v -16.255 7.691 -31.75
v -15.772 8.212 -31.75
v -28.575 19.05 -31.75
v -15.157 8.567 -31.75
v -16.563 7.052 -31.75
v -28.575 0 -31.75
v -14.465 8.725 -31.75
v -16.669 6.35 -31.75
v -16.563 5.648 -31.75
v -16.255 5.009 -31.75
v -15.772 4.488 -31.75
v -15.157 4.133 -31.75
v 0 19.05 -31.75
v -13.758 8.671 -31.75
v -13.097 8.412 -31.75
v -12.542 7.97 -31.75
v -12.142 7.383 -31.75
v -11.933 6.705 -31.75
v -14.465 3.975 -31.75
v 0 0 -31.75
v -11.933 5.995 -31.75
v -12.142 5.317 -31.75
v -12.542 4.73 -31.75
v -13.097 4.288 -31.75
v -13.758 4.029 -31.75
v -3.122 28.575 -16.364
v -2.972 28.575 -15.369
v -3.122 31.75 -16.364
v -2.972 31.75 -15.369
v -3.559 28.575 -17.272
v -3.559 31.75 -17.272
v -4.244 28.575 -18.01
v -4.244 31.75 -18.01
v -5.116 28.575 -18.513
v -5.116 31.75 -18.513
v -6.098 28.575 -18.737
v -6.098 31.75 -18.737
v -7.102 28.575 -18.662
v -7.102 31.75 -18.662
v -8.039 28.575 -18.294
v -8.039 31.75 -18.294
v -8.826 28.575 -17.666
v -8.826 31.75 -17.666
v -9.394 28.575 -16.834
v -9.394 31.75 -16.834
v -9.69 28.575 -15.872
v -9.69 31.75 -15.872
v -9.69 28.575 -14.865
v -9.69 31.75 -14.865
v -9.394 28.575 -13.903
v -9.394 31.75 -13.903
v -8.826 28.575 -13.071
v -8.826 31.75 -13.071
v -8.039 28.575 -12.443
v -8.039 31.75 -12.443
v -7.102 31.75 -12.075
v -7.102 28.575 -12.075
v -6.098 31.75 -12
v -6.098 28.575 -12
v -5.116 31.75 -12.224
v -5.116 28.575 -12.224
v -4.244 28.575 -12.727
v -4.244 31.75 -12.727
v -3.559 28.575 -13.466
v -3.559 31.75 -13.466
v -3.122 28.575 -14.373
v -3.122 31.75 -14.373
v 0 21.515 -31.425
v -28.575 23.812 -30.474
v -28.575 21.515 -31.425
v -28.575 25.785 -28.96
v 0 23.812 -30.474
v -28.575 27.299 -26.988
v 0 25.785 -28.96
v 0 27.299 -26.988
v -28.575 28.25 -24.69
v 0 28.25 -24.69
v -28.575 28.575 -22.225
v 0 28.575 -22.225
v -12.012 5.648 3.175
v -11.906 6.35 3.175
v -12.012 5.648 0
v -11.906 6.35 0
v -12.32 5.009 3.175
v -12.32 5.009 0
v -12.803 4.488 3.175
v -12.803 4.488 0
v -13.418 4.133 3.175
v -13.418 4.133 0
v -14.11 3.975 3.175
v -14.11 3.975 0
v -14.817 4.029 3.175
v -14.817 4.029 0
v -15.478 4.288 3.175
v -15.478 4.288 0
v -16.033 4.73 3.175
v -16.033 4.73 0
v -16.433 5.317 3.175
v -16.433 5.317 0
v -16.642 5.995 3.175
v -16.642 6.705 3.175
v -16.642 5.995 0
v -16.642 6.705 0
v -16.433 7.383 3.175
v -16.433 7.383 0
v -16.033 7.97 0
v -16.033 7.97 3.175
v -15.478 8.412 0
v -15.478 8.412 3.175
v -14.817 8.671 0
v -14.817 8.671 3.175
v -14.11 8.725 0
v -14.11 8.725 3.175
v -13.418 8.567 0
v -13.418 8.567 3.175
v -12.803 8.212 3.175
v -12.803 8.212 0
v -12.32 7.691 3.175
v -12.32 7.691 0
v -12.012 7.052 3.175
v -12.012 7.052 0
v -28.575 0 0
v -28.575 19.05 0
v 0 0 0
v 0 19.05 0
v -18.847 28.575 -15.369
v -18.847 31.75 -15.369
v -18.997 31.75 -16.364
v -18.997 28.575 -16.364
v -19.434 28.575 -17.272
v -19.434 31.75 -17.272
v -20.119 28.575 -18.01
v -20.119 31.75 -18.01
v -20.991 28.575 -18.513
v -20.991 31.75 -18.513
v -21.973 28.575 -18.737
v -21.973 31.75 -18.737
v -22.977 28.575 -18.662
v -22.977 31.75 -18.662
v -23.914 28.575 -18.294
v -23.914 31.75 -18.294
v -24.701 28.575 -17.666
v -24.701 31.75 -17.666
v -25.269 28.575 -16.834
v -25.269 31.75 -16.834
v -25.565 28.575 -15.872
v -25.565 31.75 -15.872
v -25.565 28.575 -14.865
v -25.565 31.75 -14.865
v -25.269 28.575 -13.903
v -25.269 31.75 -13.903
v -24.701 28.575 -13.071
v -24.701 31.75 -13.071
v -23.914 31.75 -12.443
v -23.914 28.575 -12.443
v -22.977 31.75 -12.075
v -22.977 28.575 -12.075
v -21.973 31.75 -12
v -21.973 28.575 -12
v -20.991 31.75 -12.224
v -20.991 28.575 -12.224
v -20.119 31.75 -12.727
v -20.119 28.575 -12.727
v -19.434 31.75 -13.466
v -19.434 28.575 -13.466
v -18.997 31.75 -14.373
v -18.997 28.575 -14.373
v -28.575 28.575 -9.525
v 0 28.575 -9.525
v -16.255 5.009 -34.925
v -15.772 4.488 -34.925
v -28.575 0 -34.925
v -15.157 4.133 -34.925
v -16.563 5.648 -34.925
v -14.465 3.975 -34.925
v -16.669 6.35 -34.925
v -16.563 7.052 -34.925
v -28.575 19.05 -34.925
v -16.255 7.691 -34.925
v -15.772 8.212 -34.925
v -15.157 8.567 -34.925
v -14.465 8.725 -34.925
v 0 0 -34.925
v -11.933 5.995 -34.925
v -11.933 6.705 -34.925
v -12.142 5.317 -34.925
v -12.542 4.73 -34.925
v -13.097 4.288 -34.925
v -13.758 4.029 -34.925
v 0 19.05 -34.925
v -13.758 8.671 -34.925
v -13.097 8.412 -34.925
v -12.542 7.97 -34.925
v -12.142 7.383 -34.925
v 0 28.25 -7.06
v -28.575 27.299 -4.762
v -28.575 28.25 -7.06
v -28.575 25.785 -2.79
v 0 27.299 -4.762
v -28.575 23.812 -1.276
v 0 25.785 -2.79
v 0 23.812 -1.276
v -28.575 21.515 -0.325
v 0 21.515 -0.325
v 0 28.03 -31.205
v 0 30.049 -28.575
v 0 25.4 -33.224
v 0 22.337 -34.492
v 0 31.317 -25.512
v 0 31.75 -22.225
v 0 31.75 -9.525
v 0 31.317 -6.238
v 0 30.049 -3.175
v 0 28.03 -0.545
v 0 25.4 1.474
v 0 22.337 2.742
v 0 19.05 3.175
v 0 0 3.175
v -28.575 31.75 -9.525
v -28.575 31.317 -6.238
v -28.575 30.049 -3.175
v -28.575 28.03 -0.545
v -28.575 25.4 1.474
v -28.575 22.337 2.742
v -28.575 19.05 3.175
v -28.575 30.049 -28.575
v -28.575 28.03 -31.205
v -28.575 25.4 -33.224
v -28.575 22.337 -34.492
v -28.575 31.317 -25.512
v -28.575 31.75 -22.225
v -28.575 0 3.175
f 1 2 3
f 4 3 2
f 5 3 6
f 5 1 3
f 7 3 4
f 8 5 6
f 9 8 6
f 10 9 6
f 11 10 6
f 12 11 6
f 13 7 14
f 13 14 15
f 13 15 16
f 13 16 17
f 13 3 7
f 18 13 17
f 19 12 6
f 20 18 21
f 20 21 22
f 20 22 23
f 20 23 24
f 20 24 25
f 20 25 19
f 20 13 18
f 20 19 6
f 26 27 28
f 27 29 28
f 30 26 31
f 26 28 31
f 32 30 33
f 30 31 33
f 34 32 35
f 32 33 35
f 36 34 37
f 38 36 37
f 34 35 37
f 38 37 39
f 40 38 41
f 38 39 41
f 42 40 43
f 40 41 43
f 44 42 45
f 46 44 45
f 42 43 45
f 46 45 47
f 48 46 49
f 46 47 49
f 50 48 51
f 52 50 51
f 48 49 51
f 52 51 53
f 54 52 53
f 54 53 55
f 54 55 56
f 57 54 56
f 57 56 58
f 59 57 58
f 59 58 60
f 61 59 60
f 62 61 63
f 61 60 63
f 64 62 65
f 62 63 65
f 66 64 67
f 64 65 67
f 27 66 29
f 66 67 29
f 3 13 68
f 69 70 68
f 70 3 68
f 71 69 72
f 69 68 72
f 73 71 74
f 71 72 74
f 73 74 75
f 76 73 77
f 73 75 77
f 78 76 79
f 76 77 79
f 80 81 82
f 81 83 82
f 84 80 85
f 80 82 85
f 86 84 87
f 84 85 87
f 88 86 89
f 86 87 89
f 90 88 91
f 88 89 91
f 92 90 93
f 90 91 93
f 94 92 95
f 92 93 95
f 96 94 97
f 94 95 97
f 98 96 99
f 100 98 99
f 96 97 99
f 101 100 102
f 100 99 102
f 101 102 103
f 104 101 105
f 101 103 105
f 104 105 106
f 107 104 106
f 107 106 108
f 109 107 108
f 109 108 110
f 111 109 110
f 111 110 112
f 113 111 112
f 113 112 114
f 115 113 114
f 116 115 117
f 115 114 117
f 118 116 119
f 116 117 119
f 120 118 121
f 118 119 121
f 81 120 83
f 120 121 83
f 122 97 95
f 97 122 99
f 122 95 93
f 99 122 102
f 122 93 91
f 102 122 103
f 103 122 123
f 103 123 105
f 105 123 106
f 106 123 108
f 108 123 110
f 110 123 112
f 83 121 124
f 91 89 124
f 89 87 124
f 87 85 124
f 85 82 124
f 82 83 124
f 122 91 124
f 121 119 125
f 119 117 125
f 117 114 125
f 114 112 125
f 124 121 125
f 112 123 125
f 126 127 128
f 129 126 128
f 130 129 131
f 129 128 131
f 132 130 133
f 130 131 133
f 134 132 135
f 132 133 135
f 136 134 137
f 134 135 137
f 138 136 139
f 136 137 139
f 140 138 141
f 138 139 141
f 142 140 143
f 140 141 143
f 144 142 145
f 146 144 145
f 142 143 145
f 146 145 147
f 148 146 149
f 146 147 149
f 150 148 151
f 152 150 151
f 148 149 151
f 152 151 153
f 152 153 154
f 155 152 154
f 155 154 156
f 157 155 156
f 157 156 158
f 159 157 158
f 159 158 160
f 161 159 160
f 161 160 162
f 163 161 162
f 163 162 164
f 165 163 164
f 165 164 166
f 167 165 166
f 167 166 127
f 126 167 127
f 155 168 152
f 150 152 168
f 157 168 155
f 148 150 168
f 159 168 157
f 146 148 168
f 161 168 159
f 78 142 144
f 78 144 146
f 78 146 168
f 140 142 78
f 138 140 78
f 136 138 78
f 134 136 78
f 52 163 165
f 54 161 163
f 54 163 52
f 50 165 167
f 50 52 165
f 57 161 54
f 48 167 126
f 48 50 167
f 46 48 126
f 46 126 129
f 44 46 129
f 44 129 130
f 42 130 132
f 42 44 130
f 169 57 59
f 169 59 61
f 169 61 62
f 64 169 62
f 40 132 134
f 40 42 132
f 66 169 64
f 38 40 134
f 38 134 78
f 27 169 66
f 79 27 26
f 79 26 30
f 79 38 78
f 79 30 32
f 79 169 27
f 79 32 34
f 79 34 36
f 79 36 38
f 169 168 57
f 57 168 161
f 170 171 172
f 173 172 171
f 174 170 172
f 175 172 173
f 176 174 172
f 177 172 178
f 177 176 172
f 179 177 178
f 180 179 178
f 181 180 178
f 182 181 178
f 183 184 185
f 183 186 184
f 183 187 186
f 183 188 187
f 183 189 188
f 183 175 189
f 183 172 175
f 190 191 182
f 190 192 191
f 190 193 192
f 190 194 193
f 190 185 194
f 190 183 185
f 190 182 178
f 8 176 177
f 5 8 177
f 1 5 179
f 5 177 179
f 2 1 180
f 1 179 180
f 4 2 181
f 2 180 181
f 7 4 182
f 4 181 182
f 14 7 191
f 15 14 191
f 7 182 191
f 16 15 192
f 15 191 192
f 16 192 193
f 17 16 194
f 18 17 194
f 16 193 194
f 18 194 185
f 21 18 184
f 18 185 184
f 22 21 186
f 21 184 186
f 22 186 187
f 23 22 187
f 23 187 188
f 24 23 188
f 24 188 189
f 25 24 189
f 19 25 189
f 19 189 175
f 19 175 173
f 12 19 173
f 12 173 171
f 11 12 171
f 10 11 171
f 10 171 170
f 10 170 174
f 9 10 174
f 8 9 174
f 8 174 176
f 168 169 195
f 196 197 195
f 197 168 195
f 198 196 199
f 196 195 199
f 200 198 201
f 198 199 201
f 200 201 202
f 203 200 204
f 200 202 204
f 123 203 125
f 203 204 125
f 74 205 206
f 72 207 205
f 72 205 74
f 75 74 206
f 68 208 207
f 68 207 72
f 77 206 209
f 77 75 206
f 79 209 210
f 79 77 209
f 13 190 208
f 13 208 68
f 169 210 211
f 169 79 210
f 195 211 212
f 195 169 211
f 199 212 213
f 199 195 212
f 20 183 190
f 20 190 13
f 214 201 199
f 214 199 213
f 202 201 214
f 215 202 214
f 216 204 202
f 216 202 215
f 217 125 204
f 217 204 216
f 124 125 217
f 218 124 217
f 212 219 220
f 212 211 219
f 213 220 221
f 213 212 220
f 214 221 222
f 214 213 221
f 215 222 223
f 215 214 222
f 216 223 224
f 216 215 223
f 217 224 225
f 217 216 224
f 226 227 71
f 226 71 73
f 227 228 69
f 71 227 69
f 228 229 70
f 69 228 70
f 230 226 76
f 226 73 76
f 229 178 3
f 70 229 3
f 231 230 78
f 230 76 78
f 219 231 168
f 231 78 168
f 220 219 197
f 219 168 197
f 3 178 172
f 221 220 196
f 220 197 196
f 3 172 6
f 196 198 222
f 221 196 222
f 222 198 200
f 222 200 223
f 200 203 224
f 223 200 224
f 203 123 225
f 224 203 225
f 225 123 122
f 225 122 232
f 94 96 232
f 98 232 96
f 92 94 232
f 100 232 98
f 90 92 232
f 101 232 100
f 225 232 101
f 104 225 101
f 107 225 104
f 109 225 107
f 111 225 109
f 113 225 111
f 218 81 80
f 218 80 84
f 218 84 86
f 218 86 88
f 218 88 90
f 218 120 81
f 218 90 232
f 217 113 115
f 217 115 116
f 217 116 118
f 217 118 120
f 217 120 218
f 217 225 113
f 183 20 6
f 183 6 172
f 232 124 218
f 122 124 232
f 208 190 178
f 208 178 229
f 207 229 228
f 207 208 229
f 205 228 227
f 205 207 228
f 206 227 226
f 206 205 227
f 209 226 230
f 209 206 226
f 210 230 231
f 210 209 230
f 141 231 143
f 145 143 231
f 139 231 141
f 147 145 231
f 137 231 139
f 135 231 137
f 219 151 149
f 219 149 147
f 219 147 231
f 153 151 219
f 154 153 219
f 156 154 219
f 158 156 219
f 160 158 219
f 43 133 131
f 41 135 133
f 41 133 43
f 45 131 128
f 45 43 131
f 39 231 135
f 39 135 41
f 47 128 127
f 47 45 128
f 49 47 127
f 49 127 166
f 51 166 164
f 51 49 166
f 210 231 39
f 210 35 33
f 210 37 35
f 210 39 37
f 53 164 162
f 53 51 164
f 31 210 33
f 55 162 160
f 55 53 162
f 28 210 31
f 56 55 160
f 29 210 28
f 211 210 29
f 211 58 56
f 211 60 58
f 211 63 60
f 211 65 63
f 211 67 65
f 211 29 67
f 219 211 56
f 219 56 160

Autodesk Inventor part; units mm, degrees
ref_plane "YZ Plane" through (0, 0, 0) normal (1, 0, 0) x (0, 1, 0)
ref_plane "XZ Plane" through (0, 0, 0) normal (0, 1, 0) x (-1, 0, 0)
ref_plane "XY Plane" through (0, 0, 0) normal (0, 0, 1) x (1, 0, 0)
sketch "Sketch1" plane through (0, 0, 0) normal (0, 0, 1) x (1, 0, 0)
  line L0 (0, 0) -> (-28.575, 0)
  line L1 (-28.575, 0) -> (-28.575, 19.05)
  line L2 (-28.575, 19.05) -> (0, 19.05)
  line L3 (0, 19.05) -> (0, 0)
  line L4 (-14.2875, 0) -> (-14.2875, 6.35)
  circle A0 centre (-14.2875, 6.35) radius 2.3812
  dimension "d0" = 28.575
  dimension "d1" = 19.05
  dimension "d2" = 6.35
  dimension "d3" = 4.7625
extrude "Plate1" add sketch "Sketch1" along normal blind 3.175
sketch "Sketch5" plane through (0, 28.575, -9.525) normal (0, 1, 0) x (-1, 0, 0)
  line L0 (28.575, 0) -> (0, 0)
  line L1 (0, 0) -> (0, -12.7)
  line L2 (0, -12.7) -> (28.575, -12.7)
  line L3 (28.575, -12.7) -> (28.575, 0)
edge flange "Flange3" height 25.4 angle 90 thickness 3.175 bend radius 9.525 thickness toward (0, 1, 0) relief tear relief width 3.175 relief depth 1.5875 edges at (-14.2875, 19.05, 0) wall of the first edge with corners at (-28.575, 28.575, -9.525) (0, 28.575, -9.525) (0, 28.575, -22.225) (-28.575, 28.575, -22.225)
bend "Bend3"
corner "Corner3"
sketch "Sketch6" plane through (0, 19.05, -31.75) normal (0, 0, -1) x (-1, 0, 0)
  line L0 (28.575, 0) -> (0, 0)
  line L1 (0, 0) -> (0, -19.05)
  line L2 (0, -19.05) -> (28.575, -19.05)
  line L3 (28.575, -19.05) -> (28.575, 0)
edge flange "Flange4" height 31.75 angle 90 thickness 3.175 bend radius 9.525 thickness toward (0, 0, -1) relief tear relief width 3.175 relief depth 1.5875 edges at (-14.2875, 28.575, -22.225) wall of the first edge with corners at (-28.575, 19.05, -31.75) (0, 19.05, -31.75) (0, 0, -31.75) (-28.575, 0, -31.75)
bend "Bend4"
corner "Corner4"
sketch "Sketch7" plane through (0, 0, -34.925) normal (0, 0, -1) x (-1, 0, 0)
  circle A0 centre (14.2875, 6.35) radius 2.3812 projected
  circle A1 centre (14.2875, 6.35) radius 2.3812 projected
extrude "Cut2" cut sketch "Sketch7" against normal blind 3.175
sketch "Sketch8" plane through (-28.575, 31.75, -9.525) normal (0, 1, 0) x (1, 0, 0)
  line L0 (28.575, 12.7) -> (28.575, 0) projected
  line L1 (0, 0) -> (0, 12.7) projected
  line L2 (0, 5.8436) -> (6.35, 5.8436)
  circle A0 centre (6.35, 5.8436) radius 3.3782
  line L3 (28.575, 5.8436) -> (22.225, 5.8436)
  circle A1 centre (22.225, 5.8436) radius 3.3782
  point P0 (28.575, -9.525)
  dimension "d51" = 6.35
  dimension "d52" = 6.7564
  dimension "d53" = 6.35
  dimension "d54" = 6.7564
extrude "Cut3" cut sketch "Sketch8" against normal blind 3.175
sketch "Sketch9" plane through (-28.575, 31.75, -9.525) normal (0, 1, 0) x (1, 0, 0)
  circle A0 centre (6.35, 5.8436) radius 3.3782 projected
  circle A1 centre (22.225, 5.8436) radius 3.3782 projected
  line L0 (0, 0) -> (28.575, 0) projected
  line L1 (28.575, 12.7) -> (28.575, 0) projected
  line L2 (0, 12.7) -> (28.575, 12.7) projected
  line L3 (0, 0) -> (0, 12.7) projected
  point P0 (28.575, -9.525)
sketch "Sketch10" plane through (-28.575, 28.575, -9.525) normal (0, -1, 0) x (1, 0, 0)
  circle A0 centre (6.35, -5.8436) radius 3.3782 projected
  circle A1 centre (22.225, -5.8436) radius 3.3782 projected
  line L0 (28.575, 0) -> (0, 0) projected
  line L1 (0, -12.7) -> (0, 0) projected
  line L2 (0, -12.7) -> (28.575, -12.7) projected
  line L3 (28.575, -12.7) -> (28.575, 0) projected
  point P0 (28.575, 9.525)
equation "\"d49\" = Thickness"
equation "\"d55\" = Thickness"
equation "\"d29\" = BendReliefWidth"
equation "\"d30\" = BendReliefDepth"
equation "\"d31\" = MinimumRemnant"
equation "\"d32\" = BendRadius"
equation "\"d36\" = CornerReliefSize"
equation "\"d37\" = GapSize"
equation "\"d38\" = JacobiRadiusSize"
equation "\"d39\" = BendReliefWidth"
equation "\"d40\" = BendReliefDepth"
equation "\"d41\" = MinimumRemnant"
equation "\"d42\" = BendRadius"
equation "\"d46\" = CornerReliefSize"
equation "\"d47\" = GapSize"
equation "\"d48\" = JacobiRadiusSize"
equation "\"BendRadius\" = Thickness"
equation "\"BendReliefWidth\" = Thickness"
equation "\"BendReliefDepth\" = 0.5 * Thickness"
equation "\"CornerReliefSize\" = 4 * Thickness"
equation "\"MinimumRemnant\" = 2 * Thickness"
equation "\"TransitionRadius\" = BendRadius"
equation "\"JacobiRadiusSize\" = BendRadius"
equation "\"GapSize\" = Thickness"
equation "\"d4\" = BendRadius"
equation "\"Thickness\" = 3.175"
properties part number "pulley mount" material "Aluminum 6061"
